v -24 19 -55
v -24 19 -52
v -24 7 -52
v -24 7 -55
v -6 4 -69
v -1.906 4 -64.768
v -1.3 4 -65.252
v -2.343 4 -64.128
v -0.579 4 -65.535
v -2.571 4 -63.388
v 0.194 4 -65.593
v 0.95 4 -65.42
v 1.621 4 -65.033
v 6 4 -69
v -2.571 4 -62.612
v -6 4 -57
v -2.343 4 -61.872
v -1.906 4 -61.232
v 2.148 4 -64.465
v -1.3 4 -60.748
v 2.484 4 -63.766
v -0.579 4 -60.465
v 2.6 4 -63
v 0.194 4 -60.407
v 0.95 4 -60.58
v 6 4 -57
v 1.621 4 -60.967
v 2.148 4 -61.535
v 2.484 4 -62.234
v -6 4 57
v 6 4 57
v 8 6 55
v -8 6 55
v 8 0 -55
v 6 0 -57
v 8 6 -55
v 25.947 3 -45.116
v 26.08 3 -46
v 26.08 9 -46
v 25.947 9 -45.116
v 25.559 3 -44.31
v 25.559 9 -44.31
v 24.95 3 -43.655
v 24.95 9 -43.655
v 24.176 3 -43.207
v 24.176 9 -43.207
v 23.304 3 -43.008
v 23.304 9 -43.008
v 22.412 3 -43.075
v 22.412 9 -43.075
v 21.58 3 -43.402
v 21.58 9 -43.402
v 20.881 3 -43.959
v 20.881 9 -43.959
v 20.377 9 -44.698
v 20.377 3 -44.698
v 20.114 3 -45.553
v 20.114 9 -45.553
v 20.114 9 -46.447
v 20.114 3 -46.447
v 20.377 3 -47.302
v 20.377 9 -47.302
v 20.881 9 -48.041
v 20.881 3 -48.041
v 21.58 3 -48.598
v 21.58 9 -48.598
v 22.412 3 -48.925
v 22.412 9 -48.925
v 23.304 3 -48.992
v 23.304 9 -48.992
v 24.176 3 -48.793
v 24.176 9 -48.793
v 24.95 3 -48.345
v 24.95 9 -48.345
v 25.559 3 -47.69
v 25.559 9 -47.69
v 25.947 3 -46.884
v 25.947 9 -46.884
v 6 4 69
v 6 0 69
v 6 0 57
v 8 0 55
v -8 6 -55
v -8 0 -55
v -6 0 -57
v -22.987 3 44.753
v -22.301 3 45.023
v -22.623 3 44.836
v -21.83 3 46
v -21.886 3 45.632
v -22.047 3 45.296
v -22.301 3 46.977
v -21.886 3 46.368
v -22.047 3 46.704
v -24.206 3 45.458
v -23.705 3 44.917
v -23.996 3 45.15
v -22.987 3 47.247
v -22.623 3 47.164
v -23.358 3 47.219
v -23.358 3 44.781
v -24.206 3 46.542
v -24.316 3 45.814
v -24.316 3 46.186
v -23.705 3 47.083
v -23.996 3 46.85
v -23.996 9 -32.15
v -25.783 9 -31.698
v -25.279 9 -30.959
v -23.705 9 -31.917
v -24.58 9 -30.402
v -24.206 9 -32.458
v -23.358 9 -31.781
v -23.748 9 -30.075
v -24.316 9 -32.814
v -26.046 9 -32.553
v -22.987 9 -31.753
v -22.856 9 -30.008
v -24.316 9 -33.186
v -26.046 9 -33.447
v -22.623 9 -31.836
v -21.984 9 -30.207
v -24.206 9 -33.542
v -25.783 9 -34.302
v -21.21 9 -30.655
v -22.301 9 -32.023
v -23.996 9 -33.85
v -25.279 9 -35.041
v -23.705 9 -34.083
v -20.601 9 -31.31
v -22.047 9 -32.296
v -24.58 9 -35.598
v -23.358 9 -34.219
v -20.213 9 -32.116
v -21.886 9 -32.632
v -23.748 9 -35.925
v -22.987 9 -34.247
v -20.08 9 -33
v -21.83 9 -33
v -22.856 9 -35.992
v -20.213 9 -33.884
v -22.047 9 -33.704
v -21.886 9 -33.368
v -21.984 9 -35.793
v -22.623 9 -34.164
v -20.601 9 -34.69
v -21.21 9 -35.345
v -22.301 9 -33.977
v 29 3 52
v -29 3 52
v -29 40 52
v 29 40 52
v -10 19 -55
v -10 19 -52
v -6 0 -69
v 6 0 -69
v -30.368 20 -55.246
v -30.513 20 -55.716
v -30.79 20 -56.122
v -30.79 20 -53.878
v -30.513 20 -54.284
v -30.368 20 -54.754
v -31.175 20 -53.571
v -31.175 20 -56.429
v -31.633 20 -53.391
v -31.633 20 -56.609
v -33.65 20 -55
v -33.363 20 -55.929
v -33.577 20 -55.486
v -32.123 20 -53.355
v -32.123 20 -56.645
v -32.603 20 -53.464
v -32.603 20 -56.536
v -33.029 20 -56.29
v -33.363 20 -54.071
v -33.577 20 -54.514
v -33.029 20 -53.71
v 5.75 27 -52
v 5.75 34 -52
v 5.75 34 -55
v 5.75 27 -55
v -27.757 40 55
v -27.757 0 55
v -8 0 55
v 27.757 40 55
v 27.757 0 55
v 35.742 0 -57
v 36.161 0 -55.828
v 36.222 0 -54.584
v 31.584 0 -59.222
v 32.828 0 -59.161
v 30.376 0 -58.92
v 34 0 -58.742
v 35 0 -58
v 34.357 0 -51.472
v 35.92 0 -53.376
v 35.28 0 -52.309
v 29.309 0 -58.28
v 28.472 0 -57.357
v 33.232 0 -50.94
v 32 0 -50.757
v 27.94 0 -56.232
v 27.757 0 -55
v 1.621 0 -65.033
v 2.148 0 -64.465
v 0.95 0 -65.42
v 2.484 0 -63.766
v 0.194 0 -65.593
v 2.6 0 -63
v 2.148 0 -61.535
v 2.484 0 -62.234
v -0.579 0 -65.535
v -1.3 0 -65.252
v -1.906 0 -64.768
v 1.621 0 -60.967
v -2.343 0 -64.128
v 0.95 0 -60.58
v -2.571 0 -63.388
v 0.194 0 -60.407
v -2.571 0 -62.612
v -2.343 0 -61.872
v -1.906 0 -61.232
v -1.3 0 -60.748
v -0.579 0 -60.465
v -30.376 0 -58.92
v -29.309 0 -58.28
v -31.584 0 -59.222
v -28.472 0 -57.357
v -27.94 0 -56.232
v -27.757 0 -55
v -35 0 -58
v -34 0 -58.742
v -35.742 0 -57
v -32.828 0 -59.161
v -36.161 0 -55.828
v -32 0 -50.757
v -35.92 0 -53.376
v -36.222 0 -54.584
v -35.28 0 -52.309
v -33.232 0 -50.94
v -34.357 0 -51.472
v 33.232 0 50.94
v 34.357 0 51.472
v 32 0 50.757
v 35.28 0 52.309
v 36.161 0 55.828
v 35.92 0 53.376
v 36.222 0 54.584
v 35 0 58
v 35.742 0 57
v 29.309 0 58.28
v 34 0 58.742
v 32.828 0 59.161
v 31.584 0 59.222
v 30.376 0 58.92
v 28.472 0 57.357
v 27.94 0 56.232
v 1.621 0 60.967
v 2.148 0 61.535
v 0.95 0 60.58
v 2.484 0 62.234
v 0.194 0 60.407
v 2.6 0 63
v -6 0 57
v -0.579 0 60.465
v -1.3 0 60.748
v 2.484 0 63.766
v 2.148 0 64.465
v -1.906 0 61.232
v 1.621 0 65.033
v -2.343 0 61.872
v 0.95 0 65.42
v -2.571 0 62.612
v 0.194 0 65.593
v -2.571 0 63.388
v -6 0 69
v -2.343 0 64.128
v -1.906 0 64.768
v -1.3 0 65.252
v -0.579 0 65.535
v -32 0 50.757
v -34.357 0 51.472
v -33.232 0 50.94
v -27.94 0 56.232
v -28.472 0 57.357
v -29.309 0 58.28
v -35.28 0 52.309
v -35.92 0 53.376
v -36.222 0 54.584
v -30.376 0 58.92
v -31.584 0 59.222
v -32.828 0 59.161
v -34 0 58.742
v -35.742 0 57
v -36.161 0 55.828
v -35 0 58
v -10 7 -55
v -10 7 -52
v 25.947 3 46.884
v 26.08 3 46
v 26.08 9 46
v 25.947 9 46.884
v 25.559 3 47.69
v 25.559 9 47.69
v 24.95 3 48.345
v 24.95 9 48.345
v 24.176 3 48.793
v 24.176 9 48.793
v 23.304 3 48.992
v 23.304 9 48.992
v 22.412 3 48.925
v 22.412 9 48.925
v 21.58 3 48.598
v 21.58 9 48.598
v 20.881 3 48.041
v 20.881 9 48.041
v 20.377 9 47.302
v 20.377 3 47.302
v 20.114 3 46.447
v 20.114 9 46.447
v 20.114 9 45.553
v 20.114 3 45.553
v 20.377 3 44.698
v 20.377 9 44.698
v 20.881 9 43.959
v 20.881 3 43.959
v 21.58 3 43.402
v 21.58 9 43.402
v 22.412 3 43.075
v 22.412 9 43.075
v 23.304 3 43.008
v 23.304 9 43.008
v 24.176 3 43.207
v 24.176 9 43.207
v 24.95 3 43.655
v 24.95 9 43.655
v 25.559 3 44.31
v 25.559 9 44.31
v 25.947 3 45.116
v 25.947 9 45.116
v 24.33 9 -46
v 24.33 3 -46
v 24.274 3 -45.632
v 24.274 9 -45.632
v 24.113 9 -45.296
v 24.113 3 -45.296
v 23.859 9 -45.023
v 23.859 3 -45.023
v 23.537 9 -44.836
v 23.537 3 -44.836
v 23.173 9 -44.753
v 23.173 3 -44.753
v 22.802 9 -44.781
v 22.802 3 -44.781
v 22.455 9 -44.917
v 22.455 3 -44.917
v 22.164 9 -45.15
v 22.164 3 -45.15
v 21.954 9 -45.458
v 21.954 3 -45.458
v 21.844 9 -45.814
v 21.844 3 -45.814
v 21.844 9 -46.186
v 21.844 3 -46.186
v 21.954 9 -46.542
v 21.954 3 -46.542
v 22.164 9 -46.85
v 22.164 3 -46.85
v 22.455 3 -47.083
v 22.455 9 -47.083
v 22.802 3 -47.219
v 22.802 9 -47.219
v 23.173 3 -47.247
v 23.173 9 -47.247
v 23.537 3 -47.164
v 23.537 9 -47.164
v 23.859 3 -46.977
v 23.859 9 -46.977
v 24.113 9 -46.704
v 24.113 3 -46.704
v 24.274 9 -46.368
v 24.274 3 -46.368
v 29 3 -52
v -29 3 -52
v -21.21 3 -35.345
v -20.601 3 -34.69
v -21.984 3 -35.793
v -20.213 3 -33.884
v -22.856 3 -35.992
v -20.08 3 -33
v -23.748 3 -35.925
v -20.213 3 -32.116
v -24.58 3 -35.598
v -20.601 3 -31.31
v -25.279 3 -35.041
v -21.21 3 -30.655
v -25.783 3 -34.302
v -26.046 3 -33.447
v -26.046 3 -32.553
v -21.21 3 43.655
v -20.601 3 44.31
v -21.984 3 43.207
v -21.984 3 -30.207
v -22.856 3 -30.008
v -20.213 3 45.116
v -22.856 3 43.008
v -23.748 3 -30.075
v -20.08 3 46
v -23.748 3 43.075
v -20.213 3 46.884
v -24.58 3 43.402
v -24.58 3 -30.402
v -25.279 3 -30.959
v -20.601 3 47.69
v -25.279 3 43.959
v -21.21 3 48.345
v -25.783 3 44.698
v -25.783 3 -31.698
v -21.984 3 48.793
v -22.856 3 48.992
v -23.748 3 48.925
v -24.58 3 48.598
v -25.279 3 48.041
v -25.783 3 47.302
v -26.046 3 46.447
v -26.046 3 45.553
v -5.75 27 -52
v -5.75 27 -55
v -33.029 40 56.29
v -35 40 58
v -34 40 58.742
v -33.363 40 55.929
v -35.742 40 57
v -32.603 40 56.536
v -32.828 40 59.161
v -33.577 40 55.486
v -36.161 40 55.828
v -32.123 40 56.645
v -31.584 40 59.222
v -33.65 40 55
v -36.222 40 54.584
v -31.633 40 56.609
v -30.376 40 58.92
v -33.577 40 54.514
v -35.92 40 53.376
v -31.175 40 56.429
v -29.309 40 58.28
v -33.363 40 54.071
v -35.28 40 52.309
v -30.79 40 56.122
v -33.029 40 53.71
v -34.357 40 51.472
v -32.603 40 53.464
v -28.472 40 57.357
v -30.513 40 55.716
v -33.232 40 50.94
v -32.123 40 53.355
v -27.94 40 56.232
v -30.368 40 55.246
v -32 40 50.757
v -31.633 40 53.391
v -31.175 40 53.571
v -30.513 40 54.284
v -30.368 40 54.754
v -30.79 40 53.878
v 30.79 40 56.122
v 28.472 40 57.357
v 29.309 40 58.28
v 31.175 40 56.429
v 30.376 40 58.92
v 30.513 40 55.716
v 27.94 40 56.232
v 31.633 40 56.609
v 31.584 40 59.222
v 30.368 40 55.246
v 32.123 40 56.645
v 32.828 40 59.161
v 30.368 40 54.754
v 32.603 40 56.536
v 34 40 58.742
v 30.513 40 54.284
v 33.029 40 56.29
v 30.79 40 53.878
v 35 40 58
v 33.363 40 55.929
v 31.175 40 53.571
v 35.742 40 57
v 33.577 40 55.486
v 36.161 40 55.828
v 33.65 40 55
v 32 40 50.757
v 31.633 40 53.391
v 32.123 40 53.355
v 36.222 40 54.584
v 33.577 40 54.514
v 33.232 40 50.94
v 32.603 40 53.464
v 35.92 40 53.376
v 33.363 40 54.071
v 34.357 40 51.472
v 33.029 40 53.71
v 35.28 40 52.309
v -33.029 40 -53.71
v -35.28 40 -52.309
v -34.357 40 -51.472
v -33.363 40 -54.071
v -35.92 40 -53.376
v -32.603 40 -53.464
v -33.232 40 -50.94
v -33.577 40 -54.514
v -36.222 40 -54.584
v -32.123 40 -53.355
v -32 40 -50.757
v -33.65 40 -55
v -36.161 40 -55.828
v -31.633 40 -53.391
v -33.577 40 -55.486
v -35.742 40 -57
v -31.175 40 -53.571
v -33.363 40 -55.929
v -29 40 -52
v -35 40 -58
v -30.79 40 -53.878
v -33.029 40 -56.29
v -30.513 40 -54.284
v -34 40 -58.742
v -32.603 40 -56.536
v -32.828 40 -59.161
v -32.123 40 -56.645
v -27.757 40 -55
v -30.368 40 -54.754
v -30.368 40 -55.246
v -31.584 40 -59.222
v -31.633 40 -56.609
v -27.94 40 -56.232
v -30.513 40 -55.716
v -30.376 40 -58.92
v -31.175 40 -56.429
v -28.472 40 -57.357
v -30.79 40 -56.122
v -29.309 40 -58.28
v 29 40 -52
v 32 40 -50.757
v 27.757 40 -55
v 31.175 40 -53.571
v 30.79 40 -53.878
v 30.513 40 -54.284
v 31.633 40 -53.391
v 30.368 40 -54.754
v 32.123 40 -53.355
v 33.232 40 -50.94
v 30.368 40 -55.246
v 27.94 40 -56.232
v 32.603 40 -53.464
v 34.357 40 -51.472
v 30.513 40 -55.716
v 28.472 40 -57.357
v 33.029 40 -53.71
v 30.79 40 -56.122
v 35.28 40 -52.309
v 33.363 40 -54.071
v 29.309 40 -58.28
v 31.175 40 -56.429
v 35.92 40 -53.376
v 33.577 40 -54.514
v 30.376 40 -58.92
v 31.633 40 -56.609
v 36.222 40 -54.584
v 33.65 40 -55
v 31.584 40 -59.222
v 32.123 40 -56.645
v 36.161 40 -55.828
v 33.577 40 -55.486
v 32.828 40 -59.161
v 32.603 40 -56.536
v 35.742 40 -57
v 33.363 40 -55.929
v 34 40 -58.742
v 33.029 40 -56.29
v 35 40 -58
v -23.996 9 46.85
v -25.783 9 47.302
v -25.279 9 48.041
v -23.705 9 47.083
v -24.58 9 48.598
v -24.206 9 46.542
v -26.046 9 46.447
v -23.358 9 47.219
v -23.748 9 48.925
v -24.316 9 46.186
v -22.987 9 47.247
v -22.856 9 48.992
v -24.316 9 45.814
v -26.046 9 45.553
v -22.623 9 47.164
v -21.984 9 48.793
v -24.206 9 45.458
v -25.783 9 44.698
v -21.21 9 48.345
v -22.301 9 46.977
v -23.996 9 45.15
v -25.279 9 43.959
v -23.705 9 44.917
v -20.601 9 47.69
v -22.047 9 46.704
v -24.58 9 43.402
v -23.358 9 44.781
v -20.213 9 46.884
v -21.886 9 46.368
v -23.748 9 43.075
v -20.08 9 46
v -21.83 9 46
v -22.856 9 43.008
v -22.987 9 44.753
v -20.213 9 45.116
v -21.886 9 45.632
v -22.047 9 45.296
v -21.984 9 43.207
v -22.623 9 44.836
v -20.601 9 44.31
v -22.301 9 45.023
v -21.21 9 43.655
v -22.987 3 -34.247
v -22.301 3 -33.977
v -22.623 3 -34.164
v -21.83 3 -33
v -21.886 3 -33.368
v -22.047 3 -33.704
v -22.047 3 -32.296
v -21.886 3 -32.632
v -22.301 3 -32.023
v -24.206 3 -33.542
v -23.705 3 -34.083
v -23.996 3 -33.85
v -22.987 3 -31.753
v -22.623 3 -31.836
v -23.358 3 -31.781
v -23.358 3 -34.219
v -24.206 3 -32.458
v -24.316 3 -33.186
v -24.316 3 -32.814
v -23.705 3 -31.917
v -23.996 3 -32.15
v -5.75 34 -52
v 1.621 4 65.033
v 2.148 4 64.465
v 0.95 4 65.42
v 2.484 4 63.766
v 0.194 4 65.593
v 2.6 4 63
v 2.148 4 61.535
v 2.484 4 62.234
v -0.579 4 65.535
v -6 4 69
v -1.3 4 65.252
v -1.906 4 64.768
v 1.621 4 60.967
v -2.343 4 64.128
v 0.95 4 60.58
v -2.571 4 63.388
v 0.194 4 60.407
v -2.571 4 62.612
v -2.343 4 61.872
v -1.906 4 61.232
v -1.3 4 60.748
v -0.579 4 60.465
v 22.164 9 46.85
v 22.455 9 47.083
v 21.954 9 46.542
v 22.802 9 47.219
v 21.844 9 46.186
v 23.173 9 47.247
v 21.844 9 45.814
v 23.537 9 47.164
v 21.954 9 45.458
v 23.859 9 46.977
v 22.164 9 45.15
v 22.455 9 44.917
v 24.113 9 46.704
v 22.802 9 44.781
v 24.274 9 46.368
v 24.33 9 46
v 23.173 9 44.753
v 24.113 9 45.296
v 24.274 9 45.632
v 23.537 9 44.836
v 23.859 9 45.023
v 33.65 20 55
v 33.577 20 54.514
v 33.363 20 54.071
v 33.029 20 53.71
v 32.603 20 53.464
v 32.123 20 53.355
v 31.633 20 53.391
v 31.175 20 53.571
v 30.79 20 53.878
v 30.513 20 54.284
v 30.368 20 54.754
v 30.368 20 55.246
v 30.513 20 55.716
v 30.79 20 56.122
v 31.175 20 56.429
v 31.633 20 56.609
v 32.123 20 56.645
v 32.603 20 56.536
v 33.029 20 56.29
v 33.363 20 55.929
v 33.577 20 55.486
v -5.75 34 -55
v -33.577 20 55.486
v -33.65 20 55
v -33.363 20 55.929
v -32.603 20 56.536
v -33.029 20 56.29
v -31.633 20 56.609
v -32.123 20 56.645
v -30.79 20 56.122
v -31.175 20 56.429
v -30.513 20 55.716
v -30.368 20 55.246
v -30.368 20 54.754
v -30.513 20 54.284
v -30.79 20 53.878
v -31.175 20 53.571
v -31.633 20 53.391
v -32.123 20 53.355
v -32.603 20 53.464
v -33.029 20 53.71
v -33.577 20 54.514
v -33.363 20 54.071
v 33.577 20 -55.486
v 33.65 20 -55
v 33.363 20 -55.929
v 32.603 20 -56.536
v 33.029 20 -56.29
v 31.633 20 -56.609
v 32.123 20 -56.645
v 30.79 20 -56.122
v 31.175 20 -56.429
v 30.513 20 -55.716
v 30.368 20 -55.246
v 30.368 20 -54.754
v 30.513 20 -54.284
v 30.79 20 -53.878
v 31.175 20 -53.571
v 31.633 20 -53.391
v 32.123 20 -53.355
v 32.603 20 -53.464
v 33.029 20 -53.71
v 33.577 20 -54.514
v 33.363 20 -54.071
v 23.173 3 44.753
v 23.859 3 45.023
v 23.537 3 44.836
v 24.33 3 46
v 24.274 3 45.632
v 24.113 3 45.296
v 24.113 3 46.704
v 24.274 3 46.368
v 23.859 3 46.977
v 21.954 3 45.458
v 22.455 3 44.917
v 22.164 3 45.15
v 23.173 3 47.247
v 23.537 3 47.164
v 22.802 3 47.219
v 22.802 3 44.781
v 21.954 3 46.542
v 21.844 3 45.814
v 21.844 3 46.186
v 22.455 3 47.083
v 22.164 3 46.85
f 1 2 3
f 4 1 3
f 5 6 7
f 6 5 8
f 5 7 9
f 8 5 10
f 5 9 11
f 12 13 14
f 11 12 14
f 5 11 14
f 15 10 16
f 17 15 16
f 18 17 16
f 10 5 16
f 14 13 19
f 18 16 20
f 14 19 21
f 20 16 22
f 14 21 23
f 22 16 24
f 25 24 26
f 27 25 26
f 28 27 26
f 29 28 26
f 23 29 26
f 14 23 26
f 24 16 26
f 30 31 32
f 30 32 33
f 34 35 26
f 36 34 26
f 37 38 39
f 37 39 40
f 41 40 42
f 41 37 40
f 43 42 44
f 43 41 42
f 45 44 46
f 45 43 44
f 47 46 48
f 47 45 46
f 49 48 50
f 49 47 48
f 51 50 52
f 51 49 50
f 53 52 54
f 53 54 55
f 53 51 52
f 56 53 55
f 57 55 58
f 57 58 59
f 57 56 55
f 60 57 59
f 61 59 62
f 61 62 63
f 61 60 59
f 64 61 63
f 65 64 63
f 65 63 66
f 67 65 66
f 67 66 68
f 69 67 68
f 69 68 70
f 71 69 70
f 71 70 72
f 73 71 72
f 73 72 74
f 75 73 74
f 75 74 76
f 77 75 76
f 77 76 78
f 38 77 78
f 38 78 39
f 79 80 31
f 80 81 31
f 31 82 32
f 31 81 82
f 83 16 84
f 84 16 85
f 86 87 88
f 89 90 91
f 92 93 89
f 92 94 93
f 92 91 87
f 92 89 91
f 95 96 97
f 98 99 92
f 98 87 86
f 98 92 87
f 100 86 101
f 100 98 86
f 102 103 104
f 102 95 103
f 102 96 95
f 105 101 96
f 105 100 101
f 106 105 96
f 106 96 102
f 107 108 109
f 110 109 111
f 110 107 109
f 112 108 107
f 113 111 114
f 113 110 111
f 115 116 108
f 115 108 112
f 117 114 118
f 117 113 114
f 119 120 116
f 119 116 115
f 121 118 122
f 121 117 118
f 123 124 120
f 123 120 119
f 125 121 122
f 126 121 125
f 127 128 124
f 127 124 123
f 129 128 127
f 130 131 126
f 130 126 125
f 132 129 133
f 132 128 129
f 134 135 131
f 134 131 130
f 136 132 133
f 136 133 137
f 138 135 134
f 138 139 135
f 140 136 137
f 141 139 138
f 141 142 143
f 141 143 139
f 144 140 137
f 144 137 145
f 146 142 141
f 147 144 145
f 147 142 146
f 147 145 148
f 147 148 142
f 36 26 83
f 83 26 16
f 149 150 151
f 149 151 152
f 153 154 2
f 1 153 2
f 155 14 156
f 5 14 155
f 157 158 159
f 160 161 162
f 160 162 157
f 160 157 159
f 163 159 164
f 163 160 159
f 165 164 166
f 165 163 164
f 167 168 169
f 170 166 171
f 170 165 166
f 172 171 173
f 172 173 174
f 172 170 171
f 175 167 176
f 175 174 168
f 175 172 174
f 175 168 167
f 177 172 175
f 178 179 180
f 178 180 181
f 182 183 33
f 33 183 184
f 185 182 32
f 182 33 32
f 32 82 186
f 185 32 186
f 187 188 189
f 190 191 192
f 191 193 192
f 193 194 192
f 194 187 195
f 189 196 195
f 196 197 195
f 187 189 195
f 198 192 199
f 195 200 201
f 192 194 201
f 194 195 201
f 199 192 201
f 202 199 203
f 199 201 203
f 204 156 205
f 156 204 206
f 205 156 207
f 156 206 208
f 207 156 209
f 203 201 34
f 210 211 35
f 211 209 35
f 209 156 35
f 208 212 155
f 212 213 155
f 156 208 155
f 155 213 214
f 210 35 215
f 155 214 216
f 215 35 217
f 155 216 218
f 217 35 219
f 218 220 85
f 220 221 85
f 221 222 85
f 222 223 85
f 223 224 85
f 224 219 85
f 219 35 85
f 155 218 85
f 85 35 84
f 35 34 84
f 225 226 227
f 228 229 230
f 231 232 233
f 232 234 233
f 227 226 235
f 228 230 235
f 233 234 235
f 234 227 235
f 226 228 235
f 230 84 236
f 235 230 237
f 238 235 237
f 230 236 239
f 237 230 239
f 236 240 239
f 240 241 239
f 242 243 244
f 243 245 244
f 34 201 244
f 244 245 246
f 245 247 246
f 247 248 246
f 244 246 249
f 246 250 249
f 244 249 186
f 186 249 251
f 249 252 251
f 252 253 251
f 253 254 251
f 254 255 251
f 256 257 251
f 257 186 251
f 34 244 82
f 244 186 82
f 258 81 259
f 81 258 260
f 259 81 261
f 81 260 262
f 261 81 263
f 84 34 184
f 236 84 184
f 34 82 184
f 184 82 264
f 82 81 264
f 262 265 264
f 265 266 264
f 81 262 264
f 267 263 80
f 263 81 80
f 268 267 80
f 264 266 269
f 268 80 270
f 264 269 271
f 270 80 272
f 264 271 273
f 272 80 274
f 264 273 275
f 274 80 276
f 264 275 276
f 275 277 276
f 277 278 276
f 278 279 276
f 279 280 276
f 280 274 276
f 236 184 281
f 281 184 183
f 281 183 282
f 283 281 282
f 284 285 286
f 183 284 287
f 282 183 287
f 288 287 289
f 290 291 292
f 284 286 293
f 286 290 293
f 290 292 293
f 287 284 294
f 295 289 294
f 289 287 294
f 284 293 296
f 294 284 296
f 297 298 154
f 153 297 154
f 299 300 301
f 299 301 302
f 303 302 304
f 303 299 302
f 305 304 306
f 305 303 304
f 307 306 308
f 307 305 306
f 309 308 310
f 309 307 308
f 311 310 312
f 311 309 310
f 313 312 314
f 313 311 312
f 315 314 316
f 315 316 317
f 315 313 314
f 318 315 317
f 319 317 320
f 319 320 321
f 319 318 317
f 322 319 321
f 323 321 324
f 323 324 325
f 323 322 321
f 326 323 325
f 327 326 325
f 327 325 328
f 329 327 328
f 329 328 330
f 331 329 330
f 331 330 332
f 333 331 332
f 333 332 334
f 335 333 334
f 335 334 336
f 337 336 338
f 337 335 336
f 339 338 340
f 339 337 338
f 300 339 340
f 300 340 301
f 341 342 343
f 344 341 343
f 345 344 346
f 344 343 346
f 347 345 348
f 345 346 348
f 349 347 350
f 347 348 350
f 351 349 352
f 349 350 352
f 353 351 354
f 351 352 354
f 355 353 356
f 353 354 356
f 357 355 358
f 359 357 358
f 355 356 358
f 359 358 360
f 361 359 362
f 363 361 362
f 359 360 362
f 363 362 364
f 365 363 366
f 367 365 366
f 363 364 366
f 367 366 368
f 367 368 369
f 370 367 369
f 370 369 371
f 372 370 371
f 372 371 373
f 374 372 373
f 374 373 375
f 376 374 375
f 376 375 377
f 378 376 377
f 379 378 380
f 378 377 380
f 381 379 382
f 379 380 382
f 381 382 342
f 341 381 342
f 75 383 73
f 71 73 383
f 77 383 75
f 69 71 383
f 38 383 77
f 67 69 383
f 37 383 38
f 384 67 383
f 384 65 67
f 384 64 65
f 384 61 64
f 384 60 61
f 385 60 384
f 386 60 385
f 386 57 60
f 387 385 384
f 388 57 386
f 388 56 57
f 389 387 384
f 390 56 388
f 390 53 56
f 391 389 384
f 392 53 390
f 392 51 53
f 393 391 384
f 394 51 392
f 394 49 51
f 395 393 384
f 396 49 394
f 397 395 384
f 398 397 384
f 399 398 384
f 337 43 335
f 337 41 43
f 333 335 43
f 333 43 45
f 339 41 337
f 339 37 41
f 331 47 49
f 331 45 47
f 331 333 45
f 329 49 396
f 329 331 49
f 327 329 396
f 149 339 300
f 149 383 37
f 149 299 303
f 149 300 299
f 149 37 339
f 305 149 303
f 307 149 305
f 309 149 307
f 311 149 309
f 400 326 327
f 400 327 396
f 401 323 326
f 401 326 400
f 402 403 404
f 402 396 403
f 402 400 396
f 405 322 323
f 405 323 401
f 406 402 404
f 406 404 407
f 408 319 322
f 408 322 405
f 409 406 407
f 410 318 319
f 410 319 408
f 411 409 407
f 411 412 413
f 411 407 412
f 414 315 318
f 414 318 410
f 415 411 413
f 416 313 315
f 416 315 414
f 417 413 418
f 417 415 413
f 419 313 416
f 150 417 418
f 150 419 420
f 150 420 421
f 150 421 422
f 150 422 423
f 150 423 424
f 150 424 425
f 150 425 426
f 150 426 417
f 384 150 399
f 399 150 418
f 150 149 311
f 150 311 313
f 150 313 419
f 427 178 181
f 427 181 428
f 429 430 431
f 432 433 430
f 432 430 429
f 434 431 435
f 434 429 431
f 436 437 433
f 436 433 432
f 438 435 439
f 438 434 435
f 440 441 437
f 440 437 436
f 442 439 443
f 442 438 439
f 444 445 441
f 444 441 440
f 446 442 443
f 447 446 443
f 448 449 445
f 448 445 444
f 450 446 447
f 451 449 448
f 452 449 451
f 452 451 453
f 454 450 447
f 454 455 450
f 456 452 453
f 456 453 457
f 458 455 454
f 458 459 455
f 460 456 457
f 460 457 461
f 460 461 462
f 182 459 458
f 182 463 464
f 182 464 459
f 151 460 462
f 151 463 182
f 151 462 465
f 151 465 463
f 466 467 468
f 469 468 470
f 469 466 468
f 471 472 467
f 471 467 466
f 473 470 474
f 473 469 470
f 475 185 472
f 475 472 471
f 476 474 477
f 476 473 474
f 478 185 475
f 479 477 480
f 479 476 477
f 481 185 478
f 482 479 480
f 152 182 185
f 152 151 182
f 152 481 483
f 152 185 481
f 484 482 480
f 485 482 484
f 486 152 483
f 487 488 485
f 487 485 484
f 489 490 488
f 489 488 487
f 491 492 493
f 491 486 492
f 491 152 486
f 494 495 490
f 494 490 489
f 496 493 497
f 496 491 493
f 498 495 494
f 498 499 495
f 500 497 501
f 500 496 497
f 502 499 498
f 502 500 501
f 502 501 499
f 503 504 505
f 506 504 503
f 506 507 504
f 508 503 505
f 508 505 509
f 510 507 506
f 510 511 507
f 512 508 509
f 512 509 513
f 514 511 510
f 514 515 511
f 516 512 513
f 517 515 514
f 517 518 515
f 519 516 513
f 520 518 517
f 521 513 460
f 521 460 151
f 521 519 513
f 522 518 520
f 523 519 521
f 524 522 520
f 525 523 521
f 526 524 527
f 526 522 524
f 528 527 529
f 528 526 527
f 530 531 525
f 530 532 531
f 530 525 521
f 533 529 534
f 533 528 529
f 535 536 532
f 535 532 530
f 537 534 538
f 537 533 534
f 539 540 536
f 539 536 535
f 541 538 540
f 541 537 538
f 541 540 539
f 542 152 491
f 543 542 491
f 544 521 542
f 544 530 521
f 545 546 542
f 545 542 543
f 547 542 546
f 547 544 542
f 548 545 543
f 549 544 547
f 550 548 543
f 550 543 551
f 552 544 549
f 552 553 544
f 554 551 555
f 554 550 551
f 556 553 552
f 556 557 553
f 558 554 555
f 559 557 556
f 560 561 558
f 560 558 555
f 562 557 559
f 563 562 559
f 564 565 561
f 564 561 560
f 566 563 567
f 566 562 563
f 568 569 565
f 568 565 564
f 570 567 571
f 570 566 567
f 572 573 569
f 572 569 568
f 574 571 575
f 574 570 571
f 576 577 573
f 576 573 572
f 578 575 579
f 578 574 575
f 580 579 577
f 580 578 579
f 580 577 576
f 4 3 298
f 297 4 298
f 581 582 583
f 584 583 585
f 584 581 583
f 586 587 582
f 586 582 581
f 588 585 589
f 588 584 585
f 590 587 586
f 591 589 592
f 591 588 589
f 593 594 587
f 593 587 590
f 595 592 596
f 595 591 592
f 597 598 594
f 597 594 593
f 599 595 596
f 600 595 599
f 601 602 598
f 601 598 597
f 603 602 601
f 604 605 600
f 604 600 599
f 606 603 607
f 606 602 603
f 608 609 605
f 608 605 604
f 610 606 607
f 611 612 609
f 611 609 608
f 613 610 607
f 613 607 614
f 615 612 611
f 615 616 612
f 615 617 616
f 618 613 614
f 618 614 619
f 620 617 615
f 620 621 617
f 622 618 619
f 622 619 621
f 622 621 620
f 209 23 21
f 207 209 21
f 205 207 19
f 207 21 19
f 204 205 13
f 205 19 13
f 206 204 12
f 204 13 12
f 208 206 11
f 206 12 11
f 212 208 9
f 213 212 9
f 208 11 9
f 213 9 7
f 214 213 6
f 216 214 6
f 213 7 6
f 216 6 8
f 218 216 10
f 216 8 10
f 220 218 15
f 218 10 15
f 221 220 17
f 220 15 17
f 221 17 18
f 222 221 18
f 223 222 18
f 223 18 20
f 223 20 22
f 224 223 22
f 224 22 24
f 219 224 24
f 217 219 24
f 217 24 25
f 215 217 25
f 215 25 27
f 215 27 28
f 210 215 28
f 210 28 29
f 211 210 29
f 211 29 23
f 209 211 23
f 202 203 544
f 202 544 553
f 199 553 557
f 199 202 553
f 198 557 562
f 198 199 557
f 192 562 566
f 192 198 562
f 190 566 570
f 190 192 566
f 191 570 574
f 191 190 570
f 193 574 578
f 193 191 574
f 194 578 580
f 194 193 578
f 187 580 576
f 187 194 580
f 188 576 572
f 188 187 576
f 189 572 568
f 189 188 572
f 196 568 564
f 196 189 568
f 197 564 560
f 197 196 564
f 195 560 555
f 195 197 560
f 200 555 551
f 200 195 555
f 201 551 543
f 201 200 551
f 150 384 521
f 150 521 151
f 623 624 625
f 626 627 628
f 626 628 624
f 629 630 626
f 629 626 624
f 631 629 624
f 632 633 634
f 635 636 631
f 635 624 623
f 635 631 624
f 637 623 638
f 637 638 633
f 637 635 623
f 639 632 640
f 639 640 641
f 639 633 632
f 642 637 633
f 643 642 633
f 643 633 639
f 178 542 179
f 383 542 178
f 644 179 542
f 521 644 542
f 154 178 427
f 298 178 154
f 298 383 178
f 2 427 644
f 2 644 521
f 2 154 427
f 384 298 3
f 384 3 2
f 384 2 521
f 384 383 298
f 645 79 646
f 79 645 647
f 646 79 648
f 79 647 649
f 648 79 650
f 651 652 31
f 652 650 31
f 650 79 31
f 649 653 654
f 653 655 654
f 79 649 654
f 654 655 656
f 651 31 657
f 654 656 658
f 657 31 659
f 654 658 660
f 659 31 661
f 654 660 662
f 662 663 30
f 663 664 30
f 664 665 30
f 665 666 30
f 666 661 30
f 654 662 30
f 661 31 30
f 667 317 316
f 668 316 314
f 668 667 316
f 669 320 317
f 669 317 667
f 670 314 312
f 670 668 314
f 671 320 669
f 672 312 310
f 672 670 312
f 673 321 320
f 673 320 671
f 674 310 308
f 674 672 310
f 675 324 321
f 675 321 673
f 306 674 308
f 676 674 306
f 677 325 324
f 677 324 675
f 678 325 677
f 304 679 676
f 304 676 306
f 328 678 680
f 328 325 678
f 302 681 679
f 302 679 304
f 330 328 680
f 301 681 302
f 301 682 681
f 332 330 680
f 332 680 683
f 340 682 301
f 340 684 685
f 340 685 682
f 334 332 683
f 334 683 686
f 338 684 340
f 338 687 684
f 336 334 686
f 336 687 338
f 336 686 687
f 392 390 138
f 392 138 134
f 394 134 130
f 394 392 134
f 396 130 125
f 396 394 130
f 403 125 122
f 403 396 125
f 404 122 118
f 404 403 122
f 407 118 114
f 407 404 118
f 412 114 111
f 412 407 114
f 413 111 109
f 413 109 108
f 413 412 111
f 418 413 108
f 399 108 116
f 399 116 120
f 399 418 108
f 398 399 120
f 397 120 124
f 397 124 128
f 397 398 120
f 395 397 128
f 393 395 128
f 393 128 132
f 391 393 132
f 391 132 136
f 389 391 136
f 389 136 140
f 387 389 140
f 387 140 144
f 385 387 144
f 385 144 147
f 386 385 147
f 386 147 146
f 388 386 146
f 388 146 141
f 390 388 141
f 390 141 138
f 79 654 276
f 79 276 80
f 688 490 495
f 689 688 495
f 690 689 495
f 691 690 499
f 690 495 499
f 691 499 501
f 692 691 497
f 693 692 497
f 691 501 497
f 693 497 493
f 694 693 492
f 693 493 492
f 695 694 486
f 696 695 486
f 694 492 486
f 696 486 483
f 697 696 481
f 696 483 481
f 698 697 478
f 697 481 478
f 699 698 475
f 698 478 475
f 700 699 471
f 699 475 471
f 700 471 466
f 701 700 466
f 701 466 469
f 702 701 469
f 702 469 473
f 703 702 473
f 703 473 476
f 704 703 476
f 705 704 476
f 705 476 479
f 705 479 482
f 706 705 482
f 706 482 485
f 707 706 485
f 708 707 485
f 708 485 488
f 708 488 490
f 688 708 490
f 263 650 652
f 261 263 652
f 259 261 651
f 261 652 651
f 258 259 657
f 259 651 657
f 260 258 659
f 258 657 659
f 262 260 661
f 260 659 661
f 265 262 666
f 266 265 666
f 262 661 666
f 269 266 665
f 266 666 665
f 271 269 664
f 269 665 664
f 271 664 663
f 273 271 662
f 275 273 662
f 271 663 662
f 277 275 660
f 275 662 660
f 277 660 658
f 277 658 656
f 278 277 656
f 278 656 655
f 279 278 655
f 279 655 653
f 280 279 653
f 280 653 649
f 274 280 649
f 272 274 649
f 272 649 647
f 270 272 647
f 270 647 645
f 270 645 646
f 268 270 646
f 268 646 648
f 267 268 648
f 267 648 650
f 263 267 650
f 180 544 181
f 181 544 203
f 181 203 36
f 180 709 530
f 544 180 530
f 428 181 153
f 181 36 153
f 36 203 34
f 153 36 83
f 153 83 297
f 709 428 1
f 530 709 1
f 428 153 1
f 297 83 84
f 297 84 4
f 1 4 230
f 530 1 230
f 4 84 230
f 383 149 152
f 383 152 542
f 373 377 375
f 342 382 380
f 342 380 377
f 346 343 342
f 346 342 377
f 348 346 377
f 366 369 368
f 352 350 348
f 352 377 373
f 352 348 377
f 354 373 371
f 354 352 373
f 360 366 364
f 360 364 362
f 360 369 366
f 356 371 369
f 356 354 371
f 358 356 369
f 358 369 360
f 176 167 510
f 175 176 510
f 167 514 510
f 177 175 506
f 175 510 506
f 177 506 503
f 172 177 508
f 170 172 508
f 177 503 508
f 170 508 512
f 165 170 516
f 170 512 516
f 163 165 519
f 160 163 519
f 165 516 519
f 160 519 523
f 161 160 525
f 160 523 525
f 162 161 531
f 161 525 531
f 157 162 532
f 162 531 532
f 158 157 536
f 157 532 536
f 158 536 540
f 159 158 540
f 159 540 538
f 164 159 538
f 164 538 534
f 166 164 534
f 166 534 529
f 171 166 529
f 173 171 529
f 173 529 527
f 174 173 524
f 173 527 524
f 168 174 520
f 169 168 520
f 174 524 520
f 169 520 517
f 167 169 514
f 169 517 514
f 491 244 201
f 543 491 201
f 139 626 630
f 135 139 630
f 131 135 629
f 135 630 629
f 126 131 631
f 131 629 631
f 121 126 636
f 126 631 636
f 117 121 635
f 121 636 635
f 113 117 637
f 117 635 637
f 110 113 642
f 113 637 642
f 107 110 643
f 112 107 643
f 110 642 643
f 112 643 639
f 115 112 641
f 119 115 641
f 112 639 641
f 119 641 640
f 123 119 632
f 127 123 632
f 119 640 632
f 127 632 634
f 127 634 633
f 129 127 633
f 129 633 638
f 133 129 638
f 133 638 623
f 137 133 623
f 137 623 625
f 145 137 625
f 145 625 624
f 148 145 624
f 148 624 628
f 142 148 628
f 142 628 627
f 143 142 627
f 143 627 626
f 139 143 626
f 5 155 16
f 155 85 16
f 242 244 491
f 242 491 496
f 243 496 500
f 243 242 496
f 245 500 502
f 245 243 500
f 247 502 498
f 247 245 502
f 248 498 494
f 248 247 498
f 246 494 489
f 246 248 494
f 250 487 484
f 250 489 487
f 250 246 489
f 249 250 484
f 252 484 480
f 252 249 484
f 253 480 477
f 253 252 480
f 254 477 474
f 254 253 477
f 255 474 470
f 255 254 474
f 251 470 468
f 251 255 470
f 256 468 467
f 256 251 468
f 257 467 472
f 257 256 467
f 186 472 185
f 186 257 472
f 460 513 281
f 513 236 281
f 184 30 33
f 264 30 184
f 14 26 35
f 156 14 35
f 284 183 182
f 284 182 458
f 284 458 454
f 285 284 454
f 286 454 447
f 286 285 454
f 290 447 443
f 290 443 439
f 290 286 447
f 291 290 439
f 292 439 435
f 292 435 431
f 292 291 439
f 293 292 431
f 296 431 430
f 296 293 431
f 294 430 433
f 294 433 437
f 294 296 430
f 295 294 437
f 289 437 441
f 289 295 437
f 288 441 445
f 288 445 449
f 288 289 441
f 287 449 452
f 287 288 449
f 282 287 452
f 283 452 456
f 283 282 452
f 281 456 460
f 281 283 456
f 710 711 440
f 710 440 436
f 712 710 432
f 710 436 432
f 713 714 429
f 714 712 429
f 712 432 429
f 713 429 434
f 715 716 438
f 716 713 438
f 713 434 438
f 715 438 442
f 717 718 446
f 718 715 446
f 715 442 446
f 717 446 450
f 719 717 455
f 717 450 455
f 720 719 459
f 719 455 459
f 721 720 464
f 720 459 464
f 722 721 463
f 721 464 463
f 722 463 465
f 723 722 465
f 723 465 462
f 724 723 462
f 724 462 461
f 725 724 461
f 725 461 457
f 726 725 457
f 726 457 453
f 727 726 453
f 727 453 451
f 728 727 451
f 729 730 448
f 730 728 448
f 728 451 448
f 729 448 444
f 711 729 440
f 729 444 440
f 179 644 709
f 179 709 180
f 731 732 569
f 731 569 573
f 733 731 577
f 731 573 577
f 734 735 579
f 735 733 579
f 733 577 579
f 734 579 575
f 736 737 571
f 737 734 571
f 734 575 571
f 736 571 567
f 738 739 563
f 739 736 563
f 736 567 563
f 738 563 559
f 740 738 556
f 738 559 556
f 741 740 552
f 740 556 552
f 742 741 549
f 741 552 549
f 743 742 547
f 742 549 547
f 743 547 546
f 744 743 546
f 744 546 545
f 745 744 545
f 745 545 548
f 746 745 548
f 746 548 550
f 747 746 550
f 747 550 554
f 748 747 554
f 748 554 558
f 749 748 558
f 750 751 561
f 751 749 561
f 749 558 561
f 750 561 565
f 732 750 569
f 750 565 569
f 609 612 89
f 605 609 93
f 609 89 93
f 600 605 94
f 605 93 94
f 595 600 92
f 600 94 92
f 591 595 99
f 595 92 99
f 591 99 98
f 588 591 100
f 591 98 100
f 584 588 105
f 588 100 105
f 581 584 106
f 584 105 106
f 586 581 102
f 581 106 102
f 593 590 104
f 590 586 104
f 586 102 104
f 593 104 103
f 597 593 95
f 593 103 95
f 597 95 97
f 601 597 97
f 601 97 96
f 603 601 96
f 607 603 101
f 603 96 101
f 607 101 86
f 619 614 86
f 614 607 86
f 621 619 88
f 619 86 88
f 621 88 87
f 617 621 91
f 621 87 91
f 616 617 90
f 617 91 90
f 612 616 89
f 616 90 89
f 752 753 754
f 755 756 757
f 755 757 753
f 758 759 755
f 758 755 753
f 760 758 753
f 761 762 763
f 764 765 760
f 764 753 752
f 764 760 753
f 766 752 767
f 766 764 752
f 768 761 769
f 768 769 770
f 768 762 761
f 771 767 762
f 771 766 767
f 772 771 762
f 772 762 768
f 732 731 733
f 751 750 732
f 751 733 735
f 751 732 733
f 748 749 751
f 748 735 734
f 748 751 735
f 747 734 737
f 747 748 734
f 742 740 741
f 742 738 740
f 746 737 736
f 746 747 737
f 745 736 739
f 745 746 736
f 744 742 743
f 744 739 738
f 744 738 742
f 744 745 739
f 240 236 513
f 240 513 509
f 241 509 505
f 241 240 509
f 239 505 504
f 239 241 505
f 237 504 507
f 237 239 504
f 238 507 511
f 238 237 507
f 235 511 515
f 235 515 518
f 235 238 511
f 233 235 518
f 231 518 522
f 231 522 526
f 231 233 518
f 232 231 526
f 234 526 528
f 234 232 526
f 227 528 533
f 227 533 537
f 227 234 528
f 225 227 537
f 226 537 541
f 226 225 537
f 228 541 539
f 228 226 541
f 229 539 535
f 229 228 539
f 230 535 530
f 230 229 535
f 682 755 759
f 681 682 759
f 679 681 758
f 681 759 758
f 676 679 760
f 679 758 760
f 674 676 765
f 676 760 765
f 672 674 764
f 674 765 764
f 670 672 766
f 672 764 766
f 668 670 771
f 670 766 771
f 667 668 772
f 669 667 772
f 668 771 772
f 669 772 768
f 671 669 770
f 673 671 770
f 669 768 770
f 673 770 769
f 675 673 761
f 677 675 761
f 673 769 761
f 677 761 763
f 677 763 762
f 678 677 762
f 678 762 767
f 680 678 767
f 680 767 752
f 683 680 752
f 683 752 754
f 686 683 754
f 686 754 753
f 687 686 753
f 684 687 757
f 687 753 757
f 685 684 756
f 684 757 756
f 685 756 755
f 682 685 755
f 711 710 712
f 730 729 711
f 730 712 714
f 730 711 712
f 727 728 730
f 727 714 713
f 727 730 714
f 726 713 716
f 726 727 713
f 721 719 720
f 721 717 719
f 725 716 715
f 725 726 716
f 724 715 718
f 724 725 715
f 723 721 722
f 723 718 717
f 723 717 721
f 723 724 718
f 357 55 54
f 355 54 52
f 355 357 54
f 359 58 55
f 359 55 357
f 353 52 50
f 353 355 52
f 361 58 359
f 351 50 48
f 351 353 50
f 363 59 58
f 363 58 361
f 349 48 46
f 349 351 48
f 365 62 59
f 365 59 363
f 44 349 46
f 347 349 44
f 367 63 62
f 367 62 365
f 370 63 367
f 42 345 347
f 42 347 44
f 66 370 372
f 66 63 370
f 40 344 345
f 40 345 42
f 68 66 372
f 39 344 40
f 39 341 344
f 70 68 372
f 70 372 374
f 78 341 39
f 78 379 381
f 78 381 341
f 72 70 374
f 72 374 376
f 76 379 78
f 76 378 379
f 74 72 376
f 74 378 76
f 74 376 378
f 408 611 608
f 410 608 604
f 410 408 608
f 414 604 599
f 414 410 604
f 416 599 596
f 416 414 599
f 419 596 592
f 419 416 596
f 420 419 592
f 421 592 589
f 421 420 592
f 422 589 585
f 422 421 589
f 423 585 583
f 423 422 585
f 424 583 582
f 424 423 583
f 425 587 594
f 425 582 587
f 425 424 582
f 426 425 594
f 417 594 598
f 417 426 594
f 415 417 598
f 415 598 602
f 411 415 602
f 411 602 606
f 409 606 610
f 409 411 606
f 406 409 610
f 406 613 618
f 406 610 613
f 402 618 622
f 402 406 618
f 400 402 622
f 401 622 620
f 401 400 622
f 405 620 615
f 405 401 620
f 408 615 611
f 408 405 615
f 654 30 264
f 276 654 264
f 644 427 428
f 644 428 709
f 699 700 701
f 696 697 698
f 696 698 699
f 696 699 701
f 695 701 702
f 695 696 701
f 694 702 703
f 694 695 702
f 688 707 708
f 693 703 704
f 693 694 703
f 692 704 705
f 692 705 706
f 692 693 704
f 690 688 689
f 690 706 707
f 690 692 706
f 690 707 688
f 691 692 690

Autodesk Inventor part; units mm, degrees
ref_plane "YZ Plane" through (0, 0, 0) normal (1, 0, 0) x (0, 1, 0)
ref_plane "XZ Plane" through (0, 0, 0) normal (0, 1, 0) x (-1, 0, 0)
ref_plane "XY Plane" through (0, 0, 0) normal (0, 0, 1) x (1, 0, 0)
sketch "Sketch1" plane through (0, 0, 0) normal (0, 1, 0) x (-1, 0, 0)
  line L0 (32, 55) -> (-32, 55)
  line L1 (-32, 55) -> (-32, -55)
  line L2 (-32, -55) -> (32, -55)
  line L3 (32, -55) -> (32, 55)
  line L4 (32, 55) -> (-32, -55) construction
  line L5 (-32, 55) -> (32, -55) construction
  point P0 (0, 0)
  dimension "d0" = 64
  dimension "d1" = 110
extrude "Extrusion1" add sketch "Sketch1" along normal blind 3
sketch "Sketch2" plane through (0, 3, 0) normal (0, 1, 0) x (1, 0, 0)
  line L0 (-32, -55) -> (32, -55) projected
  line L1 (32, -55) -> (32, 55) projected
  line L2 (32, 55) -> (-32, 55) projected
  line L3 (-32, 55) -> (-32, -55) projected
  line L4 (-32, -55) -> (32, -55)
  line L5 (32, -55) -> (32, 55)
  line L6 (32, 55) -> (-32, 55)
  line L7 (-32, 55) -> (-32, -55)
  line L8 (-32, -55) -> (32, 55) construction
  line L9 (32, -55) -> (-32, 55) construction
  line L10 (-29, -52) -> (29, -52)
  line L11 (29, -52) -> (29, 52)
  line L12 (29, 52) -> (-29, 52)
  line L13 (-29, 52) -> (-29, -52)
  point P0 (0, 0)
  dimension "d4" = 3
  dimension "d5" = 3
  dimension "d6" = 3
  dimension "d7" = 3
extrude "Extrusion2" add sketch "Sketch2" along normal blind 37
sketch "Sketch3" plane through (0, 3, 0) normal (0, 1, 0) x (1, 0, 0)
  line L0 (-23.08, -46) -> (23.08, -46)
  line L1 (23.08, -46) -> (23.08, 46)
  line L2 (23.08, 46) -> (-23.08, 46)
  line L3 (-23.08, 46) -> (-23.08, -46)
  circle A0 centre (-23.08, -46) radius 1.25
  circle A1 centre (23.08, -46) radius 1.25
  circle A2 centre (23.08, 46) radius 1.25
  circle A3 centre (-23.08, 33) radius 1.25
  line L4 (-29, -52) -> (-29, 52) projected
  line L5 (29, 52) -> (29, -52) projected
  line L6 (-29, 52) -> (29, 52) projected
  line L7 (29, -52) -> (-29, -52) projected
  circle A4 centre (-23.08, -46) radius 3
  circle A5 centre (-23.08, 33) radius 3
  circle A6 centre (23.08, -46) radius 3
  circle A7 centre (23.08, 46) radius 3
  point P0 (0, 0)
  dimension "d15" = 46.16
  dimension "d16" = 92
  dimension "d17" = 2.5
  dimension "d18" = 2.5
  dimension "d19" = 2.5
  dimension "d20" = 2.5
  dimension "d21" = 79
  dimension "d22" = 5.92
  dimension "d23" = 5.92
  dimension "d24" = 6
  dimension "d25" = 6
  dimension "d26" = 6
  dimension "d27" = 6
  dimension "d28" = 6
  dimension "d29" = 6
extrude "Extrusion3" add sketch "Sketch3" along normal blind 6 contours A0 L3 A4 L0 | L0 A4 L3 A0 | A6 L1 A1 L0 | L0 A1 L1 A6 | A5 L3 A3 | L3 A3 A5 | A7 L2 A2 L1 | L1 A2 L2 A7
sketch "Sketch4" plane through (-29, 3, -52) normal (0, 0, 1) x (1, 0, 0)
  line L0 (8.92, 6) -> (2.92, 6) projected
  line L1 (5, 4) -> (19, 4)
  line L2 (19, 4) -> (19, 16)
  line L3 (19, 16) -> (5, 16)
  line L4 (5, 16) -> (5, 4)
  line L5 (0, 0) -> (0, 37) projected
  point P0 (29, -3)
  dimension "d33" = 2
  dimension "d34" = 12
  dimension "d35" = 14
  dimension "d73" = 5
extrude "Extrusion4" cut sketch "Sketch4" against normal blind 6
sketch "Sketch5" plane through (-29, 3, -52) normal (0, 0, 1) x (1, 0, 0)
  line L0 (19, 16) -> (19, 4) projected
  line L1 (19, 4) -> (5, 4) projected
  line L2 (5, 4) -> (5, 16) projected
  line L3 (5, 16) -> (19, 16) projected
  line L4 (58, 0) -> (0, 0) projected
  line L5 (58, 0) -> (58, 37) projected
  line L6 (0, 37) -> (58, 37) projected
  line L7 (0, 0) -> (0, 37) projected
  line L8 (23.25, 31) -> (34.75, 31)
  line L9 (34.75, 31) -> (34.75, 24)
  line L10 (34.75, 24) -> (23.25, 24)
  line L11 (23.25, 24) -> (23.25, 31)
  line L12 (8.92, 6) -> (2.92, 6) projected
  point P0 (29, -3)
  dimension "d38" = 18
  dimension "d39" = 7
  dimension "d40" = 11.5
  dimension "d41" = 23.25
  dimension "d42" = 23.25
extrude "Extrusion5" cut sketch "Sketch5" against normal blind 6 contours L8 L9 L10 L11
sketch "Sketch7" plane through (0, 0, 0) normal (0, -1, 0) x (1, 0, 0)
  line L0 (29, 52) -> (-29, 52) projected
  line L1 (-29, 52) -> (-29, -52) projected
  line L2 (-29, -52) -> (29, -52) projected
  line L3 (29, -52) -> (29, 52) projected
  line L4 (29, 52) -> (-29, 52) projected
  line L5 (32, -55) -> (-32, -55) projected
  line L6 (-32, -55) -> (-32, 55) projected
  line L7 (-32, 55) -> (32, 55) projected
  line L8 (32, 55) -> (32, -55) projected
  line L9 (32, 55) -> (32, -55) projected
  circle A0 centre (32, 55) radius 4.2426
  point P0 (0, 0)
extrude "Extrusion6" add sketch "Sketch7" against normal blind 40 contours A0 L7 L8 | A0 L8 L7
sketch "Sketch8" plane through (0, 40, 0) normal (0, 1, 0) x (1, 0, 0)
  arc A0 (27.7574, -55) -> (32, -50.7574) centre (32, -55) ccw projected
  circle A1 centre (32, -55) radius 1.65
  point P0 (0, 0)
  dimension "d47" = 3.3
extrude "Extrusion7" cut sketch "Sketch8" against normal blind 20
mirror "Mirror1" about plane through (0, 0, 0) normal (1, 0, 0) of "Extrusion6", "Extrusion7"
mirror "Mirror2" about plane through (0, 0, 0) normal (0, 0, 1) of "Extrusion6", "Extrusion7", "Mirror1"
sketch "Sketch10" plane through (27.7574, 0, -55) normal (0, 0, -1) x (-1, 0, 0)
  line L0 (21.7574, 0) -> (33.7574, 0)
  line L1 (33.7574, 0) -> (33.7574, 4)
  line L2 (33.7574, 4) -> (21.7574, 4)
  line L3 (21.7574, 4) -> (21.7574, 0)
  line L4 (55.5147, 0) -> (55.5147, 40) projected
  line L5 (0, 40) -> (0, 0) projected
  point P0 (27.7574, 0)
  dimension "d56" = 4
  dimension "d57" = 12
  dimension "d58" = 21.7574
  dimension "d59" = 21.7574
extrude "Extrusion9" add sketch "Sketch10" along normal blind 14
chamfer "Chamfer1" distance 2 angle 45 3 edges at (6, 2, -55) (-6, 2, -55) (0, 4, -55)
sketch "Sketch11" plane through (-6, 4, -69) normal (0, 1, 0) x (1, 0, 0)
  line L0 (12, -12) -> (0, -12) projected
  line L1 (12, -12) -> (12, 0) projected
  line L2 (0, 0) -> (12, 0) projected
  line L3 (0, -12) -> (0, 0) projected
  circle A0 centre (6, -6) radius 2.6
  point P0 (6, -69)
  dimension "d65" = 5.2
  dimension "d66" = 6
  dimension "d67" = 6
extrude "Extrusion10" cut sketch "Sketch11" against normal through all contours A0
mirror "Mirror3" about plane through (0, 0, 0) normal (0, 0, 1) of "Extrusion9", "Extrusion10"
chamfer "Chamfer2" distance 2 angle 45 3 edges at (-6, 2, 55) (0, 4, 55) (6, 2, 55)
equation "\"d4\" = d5"
equation "\"d6\" = d5"
equation "\"d7\" = d5"
equation "\"d22\" = d23"
equation "\"d24\" = d25"
equation "\"d27\" = d26"
equation "\"d28\" = d26"
equation "\"d29\" = d26"
equation "\"d41\" = d42"
equation "\"d58\" = d59"
equation "\"d67\" = d66"
properties part number "Podstawa"
